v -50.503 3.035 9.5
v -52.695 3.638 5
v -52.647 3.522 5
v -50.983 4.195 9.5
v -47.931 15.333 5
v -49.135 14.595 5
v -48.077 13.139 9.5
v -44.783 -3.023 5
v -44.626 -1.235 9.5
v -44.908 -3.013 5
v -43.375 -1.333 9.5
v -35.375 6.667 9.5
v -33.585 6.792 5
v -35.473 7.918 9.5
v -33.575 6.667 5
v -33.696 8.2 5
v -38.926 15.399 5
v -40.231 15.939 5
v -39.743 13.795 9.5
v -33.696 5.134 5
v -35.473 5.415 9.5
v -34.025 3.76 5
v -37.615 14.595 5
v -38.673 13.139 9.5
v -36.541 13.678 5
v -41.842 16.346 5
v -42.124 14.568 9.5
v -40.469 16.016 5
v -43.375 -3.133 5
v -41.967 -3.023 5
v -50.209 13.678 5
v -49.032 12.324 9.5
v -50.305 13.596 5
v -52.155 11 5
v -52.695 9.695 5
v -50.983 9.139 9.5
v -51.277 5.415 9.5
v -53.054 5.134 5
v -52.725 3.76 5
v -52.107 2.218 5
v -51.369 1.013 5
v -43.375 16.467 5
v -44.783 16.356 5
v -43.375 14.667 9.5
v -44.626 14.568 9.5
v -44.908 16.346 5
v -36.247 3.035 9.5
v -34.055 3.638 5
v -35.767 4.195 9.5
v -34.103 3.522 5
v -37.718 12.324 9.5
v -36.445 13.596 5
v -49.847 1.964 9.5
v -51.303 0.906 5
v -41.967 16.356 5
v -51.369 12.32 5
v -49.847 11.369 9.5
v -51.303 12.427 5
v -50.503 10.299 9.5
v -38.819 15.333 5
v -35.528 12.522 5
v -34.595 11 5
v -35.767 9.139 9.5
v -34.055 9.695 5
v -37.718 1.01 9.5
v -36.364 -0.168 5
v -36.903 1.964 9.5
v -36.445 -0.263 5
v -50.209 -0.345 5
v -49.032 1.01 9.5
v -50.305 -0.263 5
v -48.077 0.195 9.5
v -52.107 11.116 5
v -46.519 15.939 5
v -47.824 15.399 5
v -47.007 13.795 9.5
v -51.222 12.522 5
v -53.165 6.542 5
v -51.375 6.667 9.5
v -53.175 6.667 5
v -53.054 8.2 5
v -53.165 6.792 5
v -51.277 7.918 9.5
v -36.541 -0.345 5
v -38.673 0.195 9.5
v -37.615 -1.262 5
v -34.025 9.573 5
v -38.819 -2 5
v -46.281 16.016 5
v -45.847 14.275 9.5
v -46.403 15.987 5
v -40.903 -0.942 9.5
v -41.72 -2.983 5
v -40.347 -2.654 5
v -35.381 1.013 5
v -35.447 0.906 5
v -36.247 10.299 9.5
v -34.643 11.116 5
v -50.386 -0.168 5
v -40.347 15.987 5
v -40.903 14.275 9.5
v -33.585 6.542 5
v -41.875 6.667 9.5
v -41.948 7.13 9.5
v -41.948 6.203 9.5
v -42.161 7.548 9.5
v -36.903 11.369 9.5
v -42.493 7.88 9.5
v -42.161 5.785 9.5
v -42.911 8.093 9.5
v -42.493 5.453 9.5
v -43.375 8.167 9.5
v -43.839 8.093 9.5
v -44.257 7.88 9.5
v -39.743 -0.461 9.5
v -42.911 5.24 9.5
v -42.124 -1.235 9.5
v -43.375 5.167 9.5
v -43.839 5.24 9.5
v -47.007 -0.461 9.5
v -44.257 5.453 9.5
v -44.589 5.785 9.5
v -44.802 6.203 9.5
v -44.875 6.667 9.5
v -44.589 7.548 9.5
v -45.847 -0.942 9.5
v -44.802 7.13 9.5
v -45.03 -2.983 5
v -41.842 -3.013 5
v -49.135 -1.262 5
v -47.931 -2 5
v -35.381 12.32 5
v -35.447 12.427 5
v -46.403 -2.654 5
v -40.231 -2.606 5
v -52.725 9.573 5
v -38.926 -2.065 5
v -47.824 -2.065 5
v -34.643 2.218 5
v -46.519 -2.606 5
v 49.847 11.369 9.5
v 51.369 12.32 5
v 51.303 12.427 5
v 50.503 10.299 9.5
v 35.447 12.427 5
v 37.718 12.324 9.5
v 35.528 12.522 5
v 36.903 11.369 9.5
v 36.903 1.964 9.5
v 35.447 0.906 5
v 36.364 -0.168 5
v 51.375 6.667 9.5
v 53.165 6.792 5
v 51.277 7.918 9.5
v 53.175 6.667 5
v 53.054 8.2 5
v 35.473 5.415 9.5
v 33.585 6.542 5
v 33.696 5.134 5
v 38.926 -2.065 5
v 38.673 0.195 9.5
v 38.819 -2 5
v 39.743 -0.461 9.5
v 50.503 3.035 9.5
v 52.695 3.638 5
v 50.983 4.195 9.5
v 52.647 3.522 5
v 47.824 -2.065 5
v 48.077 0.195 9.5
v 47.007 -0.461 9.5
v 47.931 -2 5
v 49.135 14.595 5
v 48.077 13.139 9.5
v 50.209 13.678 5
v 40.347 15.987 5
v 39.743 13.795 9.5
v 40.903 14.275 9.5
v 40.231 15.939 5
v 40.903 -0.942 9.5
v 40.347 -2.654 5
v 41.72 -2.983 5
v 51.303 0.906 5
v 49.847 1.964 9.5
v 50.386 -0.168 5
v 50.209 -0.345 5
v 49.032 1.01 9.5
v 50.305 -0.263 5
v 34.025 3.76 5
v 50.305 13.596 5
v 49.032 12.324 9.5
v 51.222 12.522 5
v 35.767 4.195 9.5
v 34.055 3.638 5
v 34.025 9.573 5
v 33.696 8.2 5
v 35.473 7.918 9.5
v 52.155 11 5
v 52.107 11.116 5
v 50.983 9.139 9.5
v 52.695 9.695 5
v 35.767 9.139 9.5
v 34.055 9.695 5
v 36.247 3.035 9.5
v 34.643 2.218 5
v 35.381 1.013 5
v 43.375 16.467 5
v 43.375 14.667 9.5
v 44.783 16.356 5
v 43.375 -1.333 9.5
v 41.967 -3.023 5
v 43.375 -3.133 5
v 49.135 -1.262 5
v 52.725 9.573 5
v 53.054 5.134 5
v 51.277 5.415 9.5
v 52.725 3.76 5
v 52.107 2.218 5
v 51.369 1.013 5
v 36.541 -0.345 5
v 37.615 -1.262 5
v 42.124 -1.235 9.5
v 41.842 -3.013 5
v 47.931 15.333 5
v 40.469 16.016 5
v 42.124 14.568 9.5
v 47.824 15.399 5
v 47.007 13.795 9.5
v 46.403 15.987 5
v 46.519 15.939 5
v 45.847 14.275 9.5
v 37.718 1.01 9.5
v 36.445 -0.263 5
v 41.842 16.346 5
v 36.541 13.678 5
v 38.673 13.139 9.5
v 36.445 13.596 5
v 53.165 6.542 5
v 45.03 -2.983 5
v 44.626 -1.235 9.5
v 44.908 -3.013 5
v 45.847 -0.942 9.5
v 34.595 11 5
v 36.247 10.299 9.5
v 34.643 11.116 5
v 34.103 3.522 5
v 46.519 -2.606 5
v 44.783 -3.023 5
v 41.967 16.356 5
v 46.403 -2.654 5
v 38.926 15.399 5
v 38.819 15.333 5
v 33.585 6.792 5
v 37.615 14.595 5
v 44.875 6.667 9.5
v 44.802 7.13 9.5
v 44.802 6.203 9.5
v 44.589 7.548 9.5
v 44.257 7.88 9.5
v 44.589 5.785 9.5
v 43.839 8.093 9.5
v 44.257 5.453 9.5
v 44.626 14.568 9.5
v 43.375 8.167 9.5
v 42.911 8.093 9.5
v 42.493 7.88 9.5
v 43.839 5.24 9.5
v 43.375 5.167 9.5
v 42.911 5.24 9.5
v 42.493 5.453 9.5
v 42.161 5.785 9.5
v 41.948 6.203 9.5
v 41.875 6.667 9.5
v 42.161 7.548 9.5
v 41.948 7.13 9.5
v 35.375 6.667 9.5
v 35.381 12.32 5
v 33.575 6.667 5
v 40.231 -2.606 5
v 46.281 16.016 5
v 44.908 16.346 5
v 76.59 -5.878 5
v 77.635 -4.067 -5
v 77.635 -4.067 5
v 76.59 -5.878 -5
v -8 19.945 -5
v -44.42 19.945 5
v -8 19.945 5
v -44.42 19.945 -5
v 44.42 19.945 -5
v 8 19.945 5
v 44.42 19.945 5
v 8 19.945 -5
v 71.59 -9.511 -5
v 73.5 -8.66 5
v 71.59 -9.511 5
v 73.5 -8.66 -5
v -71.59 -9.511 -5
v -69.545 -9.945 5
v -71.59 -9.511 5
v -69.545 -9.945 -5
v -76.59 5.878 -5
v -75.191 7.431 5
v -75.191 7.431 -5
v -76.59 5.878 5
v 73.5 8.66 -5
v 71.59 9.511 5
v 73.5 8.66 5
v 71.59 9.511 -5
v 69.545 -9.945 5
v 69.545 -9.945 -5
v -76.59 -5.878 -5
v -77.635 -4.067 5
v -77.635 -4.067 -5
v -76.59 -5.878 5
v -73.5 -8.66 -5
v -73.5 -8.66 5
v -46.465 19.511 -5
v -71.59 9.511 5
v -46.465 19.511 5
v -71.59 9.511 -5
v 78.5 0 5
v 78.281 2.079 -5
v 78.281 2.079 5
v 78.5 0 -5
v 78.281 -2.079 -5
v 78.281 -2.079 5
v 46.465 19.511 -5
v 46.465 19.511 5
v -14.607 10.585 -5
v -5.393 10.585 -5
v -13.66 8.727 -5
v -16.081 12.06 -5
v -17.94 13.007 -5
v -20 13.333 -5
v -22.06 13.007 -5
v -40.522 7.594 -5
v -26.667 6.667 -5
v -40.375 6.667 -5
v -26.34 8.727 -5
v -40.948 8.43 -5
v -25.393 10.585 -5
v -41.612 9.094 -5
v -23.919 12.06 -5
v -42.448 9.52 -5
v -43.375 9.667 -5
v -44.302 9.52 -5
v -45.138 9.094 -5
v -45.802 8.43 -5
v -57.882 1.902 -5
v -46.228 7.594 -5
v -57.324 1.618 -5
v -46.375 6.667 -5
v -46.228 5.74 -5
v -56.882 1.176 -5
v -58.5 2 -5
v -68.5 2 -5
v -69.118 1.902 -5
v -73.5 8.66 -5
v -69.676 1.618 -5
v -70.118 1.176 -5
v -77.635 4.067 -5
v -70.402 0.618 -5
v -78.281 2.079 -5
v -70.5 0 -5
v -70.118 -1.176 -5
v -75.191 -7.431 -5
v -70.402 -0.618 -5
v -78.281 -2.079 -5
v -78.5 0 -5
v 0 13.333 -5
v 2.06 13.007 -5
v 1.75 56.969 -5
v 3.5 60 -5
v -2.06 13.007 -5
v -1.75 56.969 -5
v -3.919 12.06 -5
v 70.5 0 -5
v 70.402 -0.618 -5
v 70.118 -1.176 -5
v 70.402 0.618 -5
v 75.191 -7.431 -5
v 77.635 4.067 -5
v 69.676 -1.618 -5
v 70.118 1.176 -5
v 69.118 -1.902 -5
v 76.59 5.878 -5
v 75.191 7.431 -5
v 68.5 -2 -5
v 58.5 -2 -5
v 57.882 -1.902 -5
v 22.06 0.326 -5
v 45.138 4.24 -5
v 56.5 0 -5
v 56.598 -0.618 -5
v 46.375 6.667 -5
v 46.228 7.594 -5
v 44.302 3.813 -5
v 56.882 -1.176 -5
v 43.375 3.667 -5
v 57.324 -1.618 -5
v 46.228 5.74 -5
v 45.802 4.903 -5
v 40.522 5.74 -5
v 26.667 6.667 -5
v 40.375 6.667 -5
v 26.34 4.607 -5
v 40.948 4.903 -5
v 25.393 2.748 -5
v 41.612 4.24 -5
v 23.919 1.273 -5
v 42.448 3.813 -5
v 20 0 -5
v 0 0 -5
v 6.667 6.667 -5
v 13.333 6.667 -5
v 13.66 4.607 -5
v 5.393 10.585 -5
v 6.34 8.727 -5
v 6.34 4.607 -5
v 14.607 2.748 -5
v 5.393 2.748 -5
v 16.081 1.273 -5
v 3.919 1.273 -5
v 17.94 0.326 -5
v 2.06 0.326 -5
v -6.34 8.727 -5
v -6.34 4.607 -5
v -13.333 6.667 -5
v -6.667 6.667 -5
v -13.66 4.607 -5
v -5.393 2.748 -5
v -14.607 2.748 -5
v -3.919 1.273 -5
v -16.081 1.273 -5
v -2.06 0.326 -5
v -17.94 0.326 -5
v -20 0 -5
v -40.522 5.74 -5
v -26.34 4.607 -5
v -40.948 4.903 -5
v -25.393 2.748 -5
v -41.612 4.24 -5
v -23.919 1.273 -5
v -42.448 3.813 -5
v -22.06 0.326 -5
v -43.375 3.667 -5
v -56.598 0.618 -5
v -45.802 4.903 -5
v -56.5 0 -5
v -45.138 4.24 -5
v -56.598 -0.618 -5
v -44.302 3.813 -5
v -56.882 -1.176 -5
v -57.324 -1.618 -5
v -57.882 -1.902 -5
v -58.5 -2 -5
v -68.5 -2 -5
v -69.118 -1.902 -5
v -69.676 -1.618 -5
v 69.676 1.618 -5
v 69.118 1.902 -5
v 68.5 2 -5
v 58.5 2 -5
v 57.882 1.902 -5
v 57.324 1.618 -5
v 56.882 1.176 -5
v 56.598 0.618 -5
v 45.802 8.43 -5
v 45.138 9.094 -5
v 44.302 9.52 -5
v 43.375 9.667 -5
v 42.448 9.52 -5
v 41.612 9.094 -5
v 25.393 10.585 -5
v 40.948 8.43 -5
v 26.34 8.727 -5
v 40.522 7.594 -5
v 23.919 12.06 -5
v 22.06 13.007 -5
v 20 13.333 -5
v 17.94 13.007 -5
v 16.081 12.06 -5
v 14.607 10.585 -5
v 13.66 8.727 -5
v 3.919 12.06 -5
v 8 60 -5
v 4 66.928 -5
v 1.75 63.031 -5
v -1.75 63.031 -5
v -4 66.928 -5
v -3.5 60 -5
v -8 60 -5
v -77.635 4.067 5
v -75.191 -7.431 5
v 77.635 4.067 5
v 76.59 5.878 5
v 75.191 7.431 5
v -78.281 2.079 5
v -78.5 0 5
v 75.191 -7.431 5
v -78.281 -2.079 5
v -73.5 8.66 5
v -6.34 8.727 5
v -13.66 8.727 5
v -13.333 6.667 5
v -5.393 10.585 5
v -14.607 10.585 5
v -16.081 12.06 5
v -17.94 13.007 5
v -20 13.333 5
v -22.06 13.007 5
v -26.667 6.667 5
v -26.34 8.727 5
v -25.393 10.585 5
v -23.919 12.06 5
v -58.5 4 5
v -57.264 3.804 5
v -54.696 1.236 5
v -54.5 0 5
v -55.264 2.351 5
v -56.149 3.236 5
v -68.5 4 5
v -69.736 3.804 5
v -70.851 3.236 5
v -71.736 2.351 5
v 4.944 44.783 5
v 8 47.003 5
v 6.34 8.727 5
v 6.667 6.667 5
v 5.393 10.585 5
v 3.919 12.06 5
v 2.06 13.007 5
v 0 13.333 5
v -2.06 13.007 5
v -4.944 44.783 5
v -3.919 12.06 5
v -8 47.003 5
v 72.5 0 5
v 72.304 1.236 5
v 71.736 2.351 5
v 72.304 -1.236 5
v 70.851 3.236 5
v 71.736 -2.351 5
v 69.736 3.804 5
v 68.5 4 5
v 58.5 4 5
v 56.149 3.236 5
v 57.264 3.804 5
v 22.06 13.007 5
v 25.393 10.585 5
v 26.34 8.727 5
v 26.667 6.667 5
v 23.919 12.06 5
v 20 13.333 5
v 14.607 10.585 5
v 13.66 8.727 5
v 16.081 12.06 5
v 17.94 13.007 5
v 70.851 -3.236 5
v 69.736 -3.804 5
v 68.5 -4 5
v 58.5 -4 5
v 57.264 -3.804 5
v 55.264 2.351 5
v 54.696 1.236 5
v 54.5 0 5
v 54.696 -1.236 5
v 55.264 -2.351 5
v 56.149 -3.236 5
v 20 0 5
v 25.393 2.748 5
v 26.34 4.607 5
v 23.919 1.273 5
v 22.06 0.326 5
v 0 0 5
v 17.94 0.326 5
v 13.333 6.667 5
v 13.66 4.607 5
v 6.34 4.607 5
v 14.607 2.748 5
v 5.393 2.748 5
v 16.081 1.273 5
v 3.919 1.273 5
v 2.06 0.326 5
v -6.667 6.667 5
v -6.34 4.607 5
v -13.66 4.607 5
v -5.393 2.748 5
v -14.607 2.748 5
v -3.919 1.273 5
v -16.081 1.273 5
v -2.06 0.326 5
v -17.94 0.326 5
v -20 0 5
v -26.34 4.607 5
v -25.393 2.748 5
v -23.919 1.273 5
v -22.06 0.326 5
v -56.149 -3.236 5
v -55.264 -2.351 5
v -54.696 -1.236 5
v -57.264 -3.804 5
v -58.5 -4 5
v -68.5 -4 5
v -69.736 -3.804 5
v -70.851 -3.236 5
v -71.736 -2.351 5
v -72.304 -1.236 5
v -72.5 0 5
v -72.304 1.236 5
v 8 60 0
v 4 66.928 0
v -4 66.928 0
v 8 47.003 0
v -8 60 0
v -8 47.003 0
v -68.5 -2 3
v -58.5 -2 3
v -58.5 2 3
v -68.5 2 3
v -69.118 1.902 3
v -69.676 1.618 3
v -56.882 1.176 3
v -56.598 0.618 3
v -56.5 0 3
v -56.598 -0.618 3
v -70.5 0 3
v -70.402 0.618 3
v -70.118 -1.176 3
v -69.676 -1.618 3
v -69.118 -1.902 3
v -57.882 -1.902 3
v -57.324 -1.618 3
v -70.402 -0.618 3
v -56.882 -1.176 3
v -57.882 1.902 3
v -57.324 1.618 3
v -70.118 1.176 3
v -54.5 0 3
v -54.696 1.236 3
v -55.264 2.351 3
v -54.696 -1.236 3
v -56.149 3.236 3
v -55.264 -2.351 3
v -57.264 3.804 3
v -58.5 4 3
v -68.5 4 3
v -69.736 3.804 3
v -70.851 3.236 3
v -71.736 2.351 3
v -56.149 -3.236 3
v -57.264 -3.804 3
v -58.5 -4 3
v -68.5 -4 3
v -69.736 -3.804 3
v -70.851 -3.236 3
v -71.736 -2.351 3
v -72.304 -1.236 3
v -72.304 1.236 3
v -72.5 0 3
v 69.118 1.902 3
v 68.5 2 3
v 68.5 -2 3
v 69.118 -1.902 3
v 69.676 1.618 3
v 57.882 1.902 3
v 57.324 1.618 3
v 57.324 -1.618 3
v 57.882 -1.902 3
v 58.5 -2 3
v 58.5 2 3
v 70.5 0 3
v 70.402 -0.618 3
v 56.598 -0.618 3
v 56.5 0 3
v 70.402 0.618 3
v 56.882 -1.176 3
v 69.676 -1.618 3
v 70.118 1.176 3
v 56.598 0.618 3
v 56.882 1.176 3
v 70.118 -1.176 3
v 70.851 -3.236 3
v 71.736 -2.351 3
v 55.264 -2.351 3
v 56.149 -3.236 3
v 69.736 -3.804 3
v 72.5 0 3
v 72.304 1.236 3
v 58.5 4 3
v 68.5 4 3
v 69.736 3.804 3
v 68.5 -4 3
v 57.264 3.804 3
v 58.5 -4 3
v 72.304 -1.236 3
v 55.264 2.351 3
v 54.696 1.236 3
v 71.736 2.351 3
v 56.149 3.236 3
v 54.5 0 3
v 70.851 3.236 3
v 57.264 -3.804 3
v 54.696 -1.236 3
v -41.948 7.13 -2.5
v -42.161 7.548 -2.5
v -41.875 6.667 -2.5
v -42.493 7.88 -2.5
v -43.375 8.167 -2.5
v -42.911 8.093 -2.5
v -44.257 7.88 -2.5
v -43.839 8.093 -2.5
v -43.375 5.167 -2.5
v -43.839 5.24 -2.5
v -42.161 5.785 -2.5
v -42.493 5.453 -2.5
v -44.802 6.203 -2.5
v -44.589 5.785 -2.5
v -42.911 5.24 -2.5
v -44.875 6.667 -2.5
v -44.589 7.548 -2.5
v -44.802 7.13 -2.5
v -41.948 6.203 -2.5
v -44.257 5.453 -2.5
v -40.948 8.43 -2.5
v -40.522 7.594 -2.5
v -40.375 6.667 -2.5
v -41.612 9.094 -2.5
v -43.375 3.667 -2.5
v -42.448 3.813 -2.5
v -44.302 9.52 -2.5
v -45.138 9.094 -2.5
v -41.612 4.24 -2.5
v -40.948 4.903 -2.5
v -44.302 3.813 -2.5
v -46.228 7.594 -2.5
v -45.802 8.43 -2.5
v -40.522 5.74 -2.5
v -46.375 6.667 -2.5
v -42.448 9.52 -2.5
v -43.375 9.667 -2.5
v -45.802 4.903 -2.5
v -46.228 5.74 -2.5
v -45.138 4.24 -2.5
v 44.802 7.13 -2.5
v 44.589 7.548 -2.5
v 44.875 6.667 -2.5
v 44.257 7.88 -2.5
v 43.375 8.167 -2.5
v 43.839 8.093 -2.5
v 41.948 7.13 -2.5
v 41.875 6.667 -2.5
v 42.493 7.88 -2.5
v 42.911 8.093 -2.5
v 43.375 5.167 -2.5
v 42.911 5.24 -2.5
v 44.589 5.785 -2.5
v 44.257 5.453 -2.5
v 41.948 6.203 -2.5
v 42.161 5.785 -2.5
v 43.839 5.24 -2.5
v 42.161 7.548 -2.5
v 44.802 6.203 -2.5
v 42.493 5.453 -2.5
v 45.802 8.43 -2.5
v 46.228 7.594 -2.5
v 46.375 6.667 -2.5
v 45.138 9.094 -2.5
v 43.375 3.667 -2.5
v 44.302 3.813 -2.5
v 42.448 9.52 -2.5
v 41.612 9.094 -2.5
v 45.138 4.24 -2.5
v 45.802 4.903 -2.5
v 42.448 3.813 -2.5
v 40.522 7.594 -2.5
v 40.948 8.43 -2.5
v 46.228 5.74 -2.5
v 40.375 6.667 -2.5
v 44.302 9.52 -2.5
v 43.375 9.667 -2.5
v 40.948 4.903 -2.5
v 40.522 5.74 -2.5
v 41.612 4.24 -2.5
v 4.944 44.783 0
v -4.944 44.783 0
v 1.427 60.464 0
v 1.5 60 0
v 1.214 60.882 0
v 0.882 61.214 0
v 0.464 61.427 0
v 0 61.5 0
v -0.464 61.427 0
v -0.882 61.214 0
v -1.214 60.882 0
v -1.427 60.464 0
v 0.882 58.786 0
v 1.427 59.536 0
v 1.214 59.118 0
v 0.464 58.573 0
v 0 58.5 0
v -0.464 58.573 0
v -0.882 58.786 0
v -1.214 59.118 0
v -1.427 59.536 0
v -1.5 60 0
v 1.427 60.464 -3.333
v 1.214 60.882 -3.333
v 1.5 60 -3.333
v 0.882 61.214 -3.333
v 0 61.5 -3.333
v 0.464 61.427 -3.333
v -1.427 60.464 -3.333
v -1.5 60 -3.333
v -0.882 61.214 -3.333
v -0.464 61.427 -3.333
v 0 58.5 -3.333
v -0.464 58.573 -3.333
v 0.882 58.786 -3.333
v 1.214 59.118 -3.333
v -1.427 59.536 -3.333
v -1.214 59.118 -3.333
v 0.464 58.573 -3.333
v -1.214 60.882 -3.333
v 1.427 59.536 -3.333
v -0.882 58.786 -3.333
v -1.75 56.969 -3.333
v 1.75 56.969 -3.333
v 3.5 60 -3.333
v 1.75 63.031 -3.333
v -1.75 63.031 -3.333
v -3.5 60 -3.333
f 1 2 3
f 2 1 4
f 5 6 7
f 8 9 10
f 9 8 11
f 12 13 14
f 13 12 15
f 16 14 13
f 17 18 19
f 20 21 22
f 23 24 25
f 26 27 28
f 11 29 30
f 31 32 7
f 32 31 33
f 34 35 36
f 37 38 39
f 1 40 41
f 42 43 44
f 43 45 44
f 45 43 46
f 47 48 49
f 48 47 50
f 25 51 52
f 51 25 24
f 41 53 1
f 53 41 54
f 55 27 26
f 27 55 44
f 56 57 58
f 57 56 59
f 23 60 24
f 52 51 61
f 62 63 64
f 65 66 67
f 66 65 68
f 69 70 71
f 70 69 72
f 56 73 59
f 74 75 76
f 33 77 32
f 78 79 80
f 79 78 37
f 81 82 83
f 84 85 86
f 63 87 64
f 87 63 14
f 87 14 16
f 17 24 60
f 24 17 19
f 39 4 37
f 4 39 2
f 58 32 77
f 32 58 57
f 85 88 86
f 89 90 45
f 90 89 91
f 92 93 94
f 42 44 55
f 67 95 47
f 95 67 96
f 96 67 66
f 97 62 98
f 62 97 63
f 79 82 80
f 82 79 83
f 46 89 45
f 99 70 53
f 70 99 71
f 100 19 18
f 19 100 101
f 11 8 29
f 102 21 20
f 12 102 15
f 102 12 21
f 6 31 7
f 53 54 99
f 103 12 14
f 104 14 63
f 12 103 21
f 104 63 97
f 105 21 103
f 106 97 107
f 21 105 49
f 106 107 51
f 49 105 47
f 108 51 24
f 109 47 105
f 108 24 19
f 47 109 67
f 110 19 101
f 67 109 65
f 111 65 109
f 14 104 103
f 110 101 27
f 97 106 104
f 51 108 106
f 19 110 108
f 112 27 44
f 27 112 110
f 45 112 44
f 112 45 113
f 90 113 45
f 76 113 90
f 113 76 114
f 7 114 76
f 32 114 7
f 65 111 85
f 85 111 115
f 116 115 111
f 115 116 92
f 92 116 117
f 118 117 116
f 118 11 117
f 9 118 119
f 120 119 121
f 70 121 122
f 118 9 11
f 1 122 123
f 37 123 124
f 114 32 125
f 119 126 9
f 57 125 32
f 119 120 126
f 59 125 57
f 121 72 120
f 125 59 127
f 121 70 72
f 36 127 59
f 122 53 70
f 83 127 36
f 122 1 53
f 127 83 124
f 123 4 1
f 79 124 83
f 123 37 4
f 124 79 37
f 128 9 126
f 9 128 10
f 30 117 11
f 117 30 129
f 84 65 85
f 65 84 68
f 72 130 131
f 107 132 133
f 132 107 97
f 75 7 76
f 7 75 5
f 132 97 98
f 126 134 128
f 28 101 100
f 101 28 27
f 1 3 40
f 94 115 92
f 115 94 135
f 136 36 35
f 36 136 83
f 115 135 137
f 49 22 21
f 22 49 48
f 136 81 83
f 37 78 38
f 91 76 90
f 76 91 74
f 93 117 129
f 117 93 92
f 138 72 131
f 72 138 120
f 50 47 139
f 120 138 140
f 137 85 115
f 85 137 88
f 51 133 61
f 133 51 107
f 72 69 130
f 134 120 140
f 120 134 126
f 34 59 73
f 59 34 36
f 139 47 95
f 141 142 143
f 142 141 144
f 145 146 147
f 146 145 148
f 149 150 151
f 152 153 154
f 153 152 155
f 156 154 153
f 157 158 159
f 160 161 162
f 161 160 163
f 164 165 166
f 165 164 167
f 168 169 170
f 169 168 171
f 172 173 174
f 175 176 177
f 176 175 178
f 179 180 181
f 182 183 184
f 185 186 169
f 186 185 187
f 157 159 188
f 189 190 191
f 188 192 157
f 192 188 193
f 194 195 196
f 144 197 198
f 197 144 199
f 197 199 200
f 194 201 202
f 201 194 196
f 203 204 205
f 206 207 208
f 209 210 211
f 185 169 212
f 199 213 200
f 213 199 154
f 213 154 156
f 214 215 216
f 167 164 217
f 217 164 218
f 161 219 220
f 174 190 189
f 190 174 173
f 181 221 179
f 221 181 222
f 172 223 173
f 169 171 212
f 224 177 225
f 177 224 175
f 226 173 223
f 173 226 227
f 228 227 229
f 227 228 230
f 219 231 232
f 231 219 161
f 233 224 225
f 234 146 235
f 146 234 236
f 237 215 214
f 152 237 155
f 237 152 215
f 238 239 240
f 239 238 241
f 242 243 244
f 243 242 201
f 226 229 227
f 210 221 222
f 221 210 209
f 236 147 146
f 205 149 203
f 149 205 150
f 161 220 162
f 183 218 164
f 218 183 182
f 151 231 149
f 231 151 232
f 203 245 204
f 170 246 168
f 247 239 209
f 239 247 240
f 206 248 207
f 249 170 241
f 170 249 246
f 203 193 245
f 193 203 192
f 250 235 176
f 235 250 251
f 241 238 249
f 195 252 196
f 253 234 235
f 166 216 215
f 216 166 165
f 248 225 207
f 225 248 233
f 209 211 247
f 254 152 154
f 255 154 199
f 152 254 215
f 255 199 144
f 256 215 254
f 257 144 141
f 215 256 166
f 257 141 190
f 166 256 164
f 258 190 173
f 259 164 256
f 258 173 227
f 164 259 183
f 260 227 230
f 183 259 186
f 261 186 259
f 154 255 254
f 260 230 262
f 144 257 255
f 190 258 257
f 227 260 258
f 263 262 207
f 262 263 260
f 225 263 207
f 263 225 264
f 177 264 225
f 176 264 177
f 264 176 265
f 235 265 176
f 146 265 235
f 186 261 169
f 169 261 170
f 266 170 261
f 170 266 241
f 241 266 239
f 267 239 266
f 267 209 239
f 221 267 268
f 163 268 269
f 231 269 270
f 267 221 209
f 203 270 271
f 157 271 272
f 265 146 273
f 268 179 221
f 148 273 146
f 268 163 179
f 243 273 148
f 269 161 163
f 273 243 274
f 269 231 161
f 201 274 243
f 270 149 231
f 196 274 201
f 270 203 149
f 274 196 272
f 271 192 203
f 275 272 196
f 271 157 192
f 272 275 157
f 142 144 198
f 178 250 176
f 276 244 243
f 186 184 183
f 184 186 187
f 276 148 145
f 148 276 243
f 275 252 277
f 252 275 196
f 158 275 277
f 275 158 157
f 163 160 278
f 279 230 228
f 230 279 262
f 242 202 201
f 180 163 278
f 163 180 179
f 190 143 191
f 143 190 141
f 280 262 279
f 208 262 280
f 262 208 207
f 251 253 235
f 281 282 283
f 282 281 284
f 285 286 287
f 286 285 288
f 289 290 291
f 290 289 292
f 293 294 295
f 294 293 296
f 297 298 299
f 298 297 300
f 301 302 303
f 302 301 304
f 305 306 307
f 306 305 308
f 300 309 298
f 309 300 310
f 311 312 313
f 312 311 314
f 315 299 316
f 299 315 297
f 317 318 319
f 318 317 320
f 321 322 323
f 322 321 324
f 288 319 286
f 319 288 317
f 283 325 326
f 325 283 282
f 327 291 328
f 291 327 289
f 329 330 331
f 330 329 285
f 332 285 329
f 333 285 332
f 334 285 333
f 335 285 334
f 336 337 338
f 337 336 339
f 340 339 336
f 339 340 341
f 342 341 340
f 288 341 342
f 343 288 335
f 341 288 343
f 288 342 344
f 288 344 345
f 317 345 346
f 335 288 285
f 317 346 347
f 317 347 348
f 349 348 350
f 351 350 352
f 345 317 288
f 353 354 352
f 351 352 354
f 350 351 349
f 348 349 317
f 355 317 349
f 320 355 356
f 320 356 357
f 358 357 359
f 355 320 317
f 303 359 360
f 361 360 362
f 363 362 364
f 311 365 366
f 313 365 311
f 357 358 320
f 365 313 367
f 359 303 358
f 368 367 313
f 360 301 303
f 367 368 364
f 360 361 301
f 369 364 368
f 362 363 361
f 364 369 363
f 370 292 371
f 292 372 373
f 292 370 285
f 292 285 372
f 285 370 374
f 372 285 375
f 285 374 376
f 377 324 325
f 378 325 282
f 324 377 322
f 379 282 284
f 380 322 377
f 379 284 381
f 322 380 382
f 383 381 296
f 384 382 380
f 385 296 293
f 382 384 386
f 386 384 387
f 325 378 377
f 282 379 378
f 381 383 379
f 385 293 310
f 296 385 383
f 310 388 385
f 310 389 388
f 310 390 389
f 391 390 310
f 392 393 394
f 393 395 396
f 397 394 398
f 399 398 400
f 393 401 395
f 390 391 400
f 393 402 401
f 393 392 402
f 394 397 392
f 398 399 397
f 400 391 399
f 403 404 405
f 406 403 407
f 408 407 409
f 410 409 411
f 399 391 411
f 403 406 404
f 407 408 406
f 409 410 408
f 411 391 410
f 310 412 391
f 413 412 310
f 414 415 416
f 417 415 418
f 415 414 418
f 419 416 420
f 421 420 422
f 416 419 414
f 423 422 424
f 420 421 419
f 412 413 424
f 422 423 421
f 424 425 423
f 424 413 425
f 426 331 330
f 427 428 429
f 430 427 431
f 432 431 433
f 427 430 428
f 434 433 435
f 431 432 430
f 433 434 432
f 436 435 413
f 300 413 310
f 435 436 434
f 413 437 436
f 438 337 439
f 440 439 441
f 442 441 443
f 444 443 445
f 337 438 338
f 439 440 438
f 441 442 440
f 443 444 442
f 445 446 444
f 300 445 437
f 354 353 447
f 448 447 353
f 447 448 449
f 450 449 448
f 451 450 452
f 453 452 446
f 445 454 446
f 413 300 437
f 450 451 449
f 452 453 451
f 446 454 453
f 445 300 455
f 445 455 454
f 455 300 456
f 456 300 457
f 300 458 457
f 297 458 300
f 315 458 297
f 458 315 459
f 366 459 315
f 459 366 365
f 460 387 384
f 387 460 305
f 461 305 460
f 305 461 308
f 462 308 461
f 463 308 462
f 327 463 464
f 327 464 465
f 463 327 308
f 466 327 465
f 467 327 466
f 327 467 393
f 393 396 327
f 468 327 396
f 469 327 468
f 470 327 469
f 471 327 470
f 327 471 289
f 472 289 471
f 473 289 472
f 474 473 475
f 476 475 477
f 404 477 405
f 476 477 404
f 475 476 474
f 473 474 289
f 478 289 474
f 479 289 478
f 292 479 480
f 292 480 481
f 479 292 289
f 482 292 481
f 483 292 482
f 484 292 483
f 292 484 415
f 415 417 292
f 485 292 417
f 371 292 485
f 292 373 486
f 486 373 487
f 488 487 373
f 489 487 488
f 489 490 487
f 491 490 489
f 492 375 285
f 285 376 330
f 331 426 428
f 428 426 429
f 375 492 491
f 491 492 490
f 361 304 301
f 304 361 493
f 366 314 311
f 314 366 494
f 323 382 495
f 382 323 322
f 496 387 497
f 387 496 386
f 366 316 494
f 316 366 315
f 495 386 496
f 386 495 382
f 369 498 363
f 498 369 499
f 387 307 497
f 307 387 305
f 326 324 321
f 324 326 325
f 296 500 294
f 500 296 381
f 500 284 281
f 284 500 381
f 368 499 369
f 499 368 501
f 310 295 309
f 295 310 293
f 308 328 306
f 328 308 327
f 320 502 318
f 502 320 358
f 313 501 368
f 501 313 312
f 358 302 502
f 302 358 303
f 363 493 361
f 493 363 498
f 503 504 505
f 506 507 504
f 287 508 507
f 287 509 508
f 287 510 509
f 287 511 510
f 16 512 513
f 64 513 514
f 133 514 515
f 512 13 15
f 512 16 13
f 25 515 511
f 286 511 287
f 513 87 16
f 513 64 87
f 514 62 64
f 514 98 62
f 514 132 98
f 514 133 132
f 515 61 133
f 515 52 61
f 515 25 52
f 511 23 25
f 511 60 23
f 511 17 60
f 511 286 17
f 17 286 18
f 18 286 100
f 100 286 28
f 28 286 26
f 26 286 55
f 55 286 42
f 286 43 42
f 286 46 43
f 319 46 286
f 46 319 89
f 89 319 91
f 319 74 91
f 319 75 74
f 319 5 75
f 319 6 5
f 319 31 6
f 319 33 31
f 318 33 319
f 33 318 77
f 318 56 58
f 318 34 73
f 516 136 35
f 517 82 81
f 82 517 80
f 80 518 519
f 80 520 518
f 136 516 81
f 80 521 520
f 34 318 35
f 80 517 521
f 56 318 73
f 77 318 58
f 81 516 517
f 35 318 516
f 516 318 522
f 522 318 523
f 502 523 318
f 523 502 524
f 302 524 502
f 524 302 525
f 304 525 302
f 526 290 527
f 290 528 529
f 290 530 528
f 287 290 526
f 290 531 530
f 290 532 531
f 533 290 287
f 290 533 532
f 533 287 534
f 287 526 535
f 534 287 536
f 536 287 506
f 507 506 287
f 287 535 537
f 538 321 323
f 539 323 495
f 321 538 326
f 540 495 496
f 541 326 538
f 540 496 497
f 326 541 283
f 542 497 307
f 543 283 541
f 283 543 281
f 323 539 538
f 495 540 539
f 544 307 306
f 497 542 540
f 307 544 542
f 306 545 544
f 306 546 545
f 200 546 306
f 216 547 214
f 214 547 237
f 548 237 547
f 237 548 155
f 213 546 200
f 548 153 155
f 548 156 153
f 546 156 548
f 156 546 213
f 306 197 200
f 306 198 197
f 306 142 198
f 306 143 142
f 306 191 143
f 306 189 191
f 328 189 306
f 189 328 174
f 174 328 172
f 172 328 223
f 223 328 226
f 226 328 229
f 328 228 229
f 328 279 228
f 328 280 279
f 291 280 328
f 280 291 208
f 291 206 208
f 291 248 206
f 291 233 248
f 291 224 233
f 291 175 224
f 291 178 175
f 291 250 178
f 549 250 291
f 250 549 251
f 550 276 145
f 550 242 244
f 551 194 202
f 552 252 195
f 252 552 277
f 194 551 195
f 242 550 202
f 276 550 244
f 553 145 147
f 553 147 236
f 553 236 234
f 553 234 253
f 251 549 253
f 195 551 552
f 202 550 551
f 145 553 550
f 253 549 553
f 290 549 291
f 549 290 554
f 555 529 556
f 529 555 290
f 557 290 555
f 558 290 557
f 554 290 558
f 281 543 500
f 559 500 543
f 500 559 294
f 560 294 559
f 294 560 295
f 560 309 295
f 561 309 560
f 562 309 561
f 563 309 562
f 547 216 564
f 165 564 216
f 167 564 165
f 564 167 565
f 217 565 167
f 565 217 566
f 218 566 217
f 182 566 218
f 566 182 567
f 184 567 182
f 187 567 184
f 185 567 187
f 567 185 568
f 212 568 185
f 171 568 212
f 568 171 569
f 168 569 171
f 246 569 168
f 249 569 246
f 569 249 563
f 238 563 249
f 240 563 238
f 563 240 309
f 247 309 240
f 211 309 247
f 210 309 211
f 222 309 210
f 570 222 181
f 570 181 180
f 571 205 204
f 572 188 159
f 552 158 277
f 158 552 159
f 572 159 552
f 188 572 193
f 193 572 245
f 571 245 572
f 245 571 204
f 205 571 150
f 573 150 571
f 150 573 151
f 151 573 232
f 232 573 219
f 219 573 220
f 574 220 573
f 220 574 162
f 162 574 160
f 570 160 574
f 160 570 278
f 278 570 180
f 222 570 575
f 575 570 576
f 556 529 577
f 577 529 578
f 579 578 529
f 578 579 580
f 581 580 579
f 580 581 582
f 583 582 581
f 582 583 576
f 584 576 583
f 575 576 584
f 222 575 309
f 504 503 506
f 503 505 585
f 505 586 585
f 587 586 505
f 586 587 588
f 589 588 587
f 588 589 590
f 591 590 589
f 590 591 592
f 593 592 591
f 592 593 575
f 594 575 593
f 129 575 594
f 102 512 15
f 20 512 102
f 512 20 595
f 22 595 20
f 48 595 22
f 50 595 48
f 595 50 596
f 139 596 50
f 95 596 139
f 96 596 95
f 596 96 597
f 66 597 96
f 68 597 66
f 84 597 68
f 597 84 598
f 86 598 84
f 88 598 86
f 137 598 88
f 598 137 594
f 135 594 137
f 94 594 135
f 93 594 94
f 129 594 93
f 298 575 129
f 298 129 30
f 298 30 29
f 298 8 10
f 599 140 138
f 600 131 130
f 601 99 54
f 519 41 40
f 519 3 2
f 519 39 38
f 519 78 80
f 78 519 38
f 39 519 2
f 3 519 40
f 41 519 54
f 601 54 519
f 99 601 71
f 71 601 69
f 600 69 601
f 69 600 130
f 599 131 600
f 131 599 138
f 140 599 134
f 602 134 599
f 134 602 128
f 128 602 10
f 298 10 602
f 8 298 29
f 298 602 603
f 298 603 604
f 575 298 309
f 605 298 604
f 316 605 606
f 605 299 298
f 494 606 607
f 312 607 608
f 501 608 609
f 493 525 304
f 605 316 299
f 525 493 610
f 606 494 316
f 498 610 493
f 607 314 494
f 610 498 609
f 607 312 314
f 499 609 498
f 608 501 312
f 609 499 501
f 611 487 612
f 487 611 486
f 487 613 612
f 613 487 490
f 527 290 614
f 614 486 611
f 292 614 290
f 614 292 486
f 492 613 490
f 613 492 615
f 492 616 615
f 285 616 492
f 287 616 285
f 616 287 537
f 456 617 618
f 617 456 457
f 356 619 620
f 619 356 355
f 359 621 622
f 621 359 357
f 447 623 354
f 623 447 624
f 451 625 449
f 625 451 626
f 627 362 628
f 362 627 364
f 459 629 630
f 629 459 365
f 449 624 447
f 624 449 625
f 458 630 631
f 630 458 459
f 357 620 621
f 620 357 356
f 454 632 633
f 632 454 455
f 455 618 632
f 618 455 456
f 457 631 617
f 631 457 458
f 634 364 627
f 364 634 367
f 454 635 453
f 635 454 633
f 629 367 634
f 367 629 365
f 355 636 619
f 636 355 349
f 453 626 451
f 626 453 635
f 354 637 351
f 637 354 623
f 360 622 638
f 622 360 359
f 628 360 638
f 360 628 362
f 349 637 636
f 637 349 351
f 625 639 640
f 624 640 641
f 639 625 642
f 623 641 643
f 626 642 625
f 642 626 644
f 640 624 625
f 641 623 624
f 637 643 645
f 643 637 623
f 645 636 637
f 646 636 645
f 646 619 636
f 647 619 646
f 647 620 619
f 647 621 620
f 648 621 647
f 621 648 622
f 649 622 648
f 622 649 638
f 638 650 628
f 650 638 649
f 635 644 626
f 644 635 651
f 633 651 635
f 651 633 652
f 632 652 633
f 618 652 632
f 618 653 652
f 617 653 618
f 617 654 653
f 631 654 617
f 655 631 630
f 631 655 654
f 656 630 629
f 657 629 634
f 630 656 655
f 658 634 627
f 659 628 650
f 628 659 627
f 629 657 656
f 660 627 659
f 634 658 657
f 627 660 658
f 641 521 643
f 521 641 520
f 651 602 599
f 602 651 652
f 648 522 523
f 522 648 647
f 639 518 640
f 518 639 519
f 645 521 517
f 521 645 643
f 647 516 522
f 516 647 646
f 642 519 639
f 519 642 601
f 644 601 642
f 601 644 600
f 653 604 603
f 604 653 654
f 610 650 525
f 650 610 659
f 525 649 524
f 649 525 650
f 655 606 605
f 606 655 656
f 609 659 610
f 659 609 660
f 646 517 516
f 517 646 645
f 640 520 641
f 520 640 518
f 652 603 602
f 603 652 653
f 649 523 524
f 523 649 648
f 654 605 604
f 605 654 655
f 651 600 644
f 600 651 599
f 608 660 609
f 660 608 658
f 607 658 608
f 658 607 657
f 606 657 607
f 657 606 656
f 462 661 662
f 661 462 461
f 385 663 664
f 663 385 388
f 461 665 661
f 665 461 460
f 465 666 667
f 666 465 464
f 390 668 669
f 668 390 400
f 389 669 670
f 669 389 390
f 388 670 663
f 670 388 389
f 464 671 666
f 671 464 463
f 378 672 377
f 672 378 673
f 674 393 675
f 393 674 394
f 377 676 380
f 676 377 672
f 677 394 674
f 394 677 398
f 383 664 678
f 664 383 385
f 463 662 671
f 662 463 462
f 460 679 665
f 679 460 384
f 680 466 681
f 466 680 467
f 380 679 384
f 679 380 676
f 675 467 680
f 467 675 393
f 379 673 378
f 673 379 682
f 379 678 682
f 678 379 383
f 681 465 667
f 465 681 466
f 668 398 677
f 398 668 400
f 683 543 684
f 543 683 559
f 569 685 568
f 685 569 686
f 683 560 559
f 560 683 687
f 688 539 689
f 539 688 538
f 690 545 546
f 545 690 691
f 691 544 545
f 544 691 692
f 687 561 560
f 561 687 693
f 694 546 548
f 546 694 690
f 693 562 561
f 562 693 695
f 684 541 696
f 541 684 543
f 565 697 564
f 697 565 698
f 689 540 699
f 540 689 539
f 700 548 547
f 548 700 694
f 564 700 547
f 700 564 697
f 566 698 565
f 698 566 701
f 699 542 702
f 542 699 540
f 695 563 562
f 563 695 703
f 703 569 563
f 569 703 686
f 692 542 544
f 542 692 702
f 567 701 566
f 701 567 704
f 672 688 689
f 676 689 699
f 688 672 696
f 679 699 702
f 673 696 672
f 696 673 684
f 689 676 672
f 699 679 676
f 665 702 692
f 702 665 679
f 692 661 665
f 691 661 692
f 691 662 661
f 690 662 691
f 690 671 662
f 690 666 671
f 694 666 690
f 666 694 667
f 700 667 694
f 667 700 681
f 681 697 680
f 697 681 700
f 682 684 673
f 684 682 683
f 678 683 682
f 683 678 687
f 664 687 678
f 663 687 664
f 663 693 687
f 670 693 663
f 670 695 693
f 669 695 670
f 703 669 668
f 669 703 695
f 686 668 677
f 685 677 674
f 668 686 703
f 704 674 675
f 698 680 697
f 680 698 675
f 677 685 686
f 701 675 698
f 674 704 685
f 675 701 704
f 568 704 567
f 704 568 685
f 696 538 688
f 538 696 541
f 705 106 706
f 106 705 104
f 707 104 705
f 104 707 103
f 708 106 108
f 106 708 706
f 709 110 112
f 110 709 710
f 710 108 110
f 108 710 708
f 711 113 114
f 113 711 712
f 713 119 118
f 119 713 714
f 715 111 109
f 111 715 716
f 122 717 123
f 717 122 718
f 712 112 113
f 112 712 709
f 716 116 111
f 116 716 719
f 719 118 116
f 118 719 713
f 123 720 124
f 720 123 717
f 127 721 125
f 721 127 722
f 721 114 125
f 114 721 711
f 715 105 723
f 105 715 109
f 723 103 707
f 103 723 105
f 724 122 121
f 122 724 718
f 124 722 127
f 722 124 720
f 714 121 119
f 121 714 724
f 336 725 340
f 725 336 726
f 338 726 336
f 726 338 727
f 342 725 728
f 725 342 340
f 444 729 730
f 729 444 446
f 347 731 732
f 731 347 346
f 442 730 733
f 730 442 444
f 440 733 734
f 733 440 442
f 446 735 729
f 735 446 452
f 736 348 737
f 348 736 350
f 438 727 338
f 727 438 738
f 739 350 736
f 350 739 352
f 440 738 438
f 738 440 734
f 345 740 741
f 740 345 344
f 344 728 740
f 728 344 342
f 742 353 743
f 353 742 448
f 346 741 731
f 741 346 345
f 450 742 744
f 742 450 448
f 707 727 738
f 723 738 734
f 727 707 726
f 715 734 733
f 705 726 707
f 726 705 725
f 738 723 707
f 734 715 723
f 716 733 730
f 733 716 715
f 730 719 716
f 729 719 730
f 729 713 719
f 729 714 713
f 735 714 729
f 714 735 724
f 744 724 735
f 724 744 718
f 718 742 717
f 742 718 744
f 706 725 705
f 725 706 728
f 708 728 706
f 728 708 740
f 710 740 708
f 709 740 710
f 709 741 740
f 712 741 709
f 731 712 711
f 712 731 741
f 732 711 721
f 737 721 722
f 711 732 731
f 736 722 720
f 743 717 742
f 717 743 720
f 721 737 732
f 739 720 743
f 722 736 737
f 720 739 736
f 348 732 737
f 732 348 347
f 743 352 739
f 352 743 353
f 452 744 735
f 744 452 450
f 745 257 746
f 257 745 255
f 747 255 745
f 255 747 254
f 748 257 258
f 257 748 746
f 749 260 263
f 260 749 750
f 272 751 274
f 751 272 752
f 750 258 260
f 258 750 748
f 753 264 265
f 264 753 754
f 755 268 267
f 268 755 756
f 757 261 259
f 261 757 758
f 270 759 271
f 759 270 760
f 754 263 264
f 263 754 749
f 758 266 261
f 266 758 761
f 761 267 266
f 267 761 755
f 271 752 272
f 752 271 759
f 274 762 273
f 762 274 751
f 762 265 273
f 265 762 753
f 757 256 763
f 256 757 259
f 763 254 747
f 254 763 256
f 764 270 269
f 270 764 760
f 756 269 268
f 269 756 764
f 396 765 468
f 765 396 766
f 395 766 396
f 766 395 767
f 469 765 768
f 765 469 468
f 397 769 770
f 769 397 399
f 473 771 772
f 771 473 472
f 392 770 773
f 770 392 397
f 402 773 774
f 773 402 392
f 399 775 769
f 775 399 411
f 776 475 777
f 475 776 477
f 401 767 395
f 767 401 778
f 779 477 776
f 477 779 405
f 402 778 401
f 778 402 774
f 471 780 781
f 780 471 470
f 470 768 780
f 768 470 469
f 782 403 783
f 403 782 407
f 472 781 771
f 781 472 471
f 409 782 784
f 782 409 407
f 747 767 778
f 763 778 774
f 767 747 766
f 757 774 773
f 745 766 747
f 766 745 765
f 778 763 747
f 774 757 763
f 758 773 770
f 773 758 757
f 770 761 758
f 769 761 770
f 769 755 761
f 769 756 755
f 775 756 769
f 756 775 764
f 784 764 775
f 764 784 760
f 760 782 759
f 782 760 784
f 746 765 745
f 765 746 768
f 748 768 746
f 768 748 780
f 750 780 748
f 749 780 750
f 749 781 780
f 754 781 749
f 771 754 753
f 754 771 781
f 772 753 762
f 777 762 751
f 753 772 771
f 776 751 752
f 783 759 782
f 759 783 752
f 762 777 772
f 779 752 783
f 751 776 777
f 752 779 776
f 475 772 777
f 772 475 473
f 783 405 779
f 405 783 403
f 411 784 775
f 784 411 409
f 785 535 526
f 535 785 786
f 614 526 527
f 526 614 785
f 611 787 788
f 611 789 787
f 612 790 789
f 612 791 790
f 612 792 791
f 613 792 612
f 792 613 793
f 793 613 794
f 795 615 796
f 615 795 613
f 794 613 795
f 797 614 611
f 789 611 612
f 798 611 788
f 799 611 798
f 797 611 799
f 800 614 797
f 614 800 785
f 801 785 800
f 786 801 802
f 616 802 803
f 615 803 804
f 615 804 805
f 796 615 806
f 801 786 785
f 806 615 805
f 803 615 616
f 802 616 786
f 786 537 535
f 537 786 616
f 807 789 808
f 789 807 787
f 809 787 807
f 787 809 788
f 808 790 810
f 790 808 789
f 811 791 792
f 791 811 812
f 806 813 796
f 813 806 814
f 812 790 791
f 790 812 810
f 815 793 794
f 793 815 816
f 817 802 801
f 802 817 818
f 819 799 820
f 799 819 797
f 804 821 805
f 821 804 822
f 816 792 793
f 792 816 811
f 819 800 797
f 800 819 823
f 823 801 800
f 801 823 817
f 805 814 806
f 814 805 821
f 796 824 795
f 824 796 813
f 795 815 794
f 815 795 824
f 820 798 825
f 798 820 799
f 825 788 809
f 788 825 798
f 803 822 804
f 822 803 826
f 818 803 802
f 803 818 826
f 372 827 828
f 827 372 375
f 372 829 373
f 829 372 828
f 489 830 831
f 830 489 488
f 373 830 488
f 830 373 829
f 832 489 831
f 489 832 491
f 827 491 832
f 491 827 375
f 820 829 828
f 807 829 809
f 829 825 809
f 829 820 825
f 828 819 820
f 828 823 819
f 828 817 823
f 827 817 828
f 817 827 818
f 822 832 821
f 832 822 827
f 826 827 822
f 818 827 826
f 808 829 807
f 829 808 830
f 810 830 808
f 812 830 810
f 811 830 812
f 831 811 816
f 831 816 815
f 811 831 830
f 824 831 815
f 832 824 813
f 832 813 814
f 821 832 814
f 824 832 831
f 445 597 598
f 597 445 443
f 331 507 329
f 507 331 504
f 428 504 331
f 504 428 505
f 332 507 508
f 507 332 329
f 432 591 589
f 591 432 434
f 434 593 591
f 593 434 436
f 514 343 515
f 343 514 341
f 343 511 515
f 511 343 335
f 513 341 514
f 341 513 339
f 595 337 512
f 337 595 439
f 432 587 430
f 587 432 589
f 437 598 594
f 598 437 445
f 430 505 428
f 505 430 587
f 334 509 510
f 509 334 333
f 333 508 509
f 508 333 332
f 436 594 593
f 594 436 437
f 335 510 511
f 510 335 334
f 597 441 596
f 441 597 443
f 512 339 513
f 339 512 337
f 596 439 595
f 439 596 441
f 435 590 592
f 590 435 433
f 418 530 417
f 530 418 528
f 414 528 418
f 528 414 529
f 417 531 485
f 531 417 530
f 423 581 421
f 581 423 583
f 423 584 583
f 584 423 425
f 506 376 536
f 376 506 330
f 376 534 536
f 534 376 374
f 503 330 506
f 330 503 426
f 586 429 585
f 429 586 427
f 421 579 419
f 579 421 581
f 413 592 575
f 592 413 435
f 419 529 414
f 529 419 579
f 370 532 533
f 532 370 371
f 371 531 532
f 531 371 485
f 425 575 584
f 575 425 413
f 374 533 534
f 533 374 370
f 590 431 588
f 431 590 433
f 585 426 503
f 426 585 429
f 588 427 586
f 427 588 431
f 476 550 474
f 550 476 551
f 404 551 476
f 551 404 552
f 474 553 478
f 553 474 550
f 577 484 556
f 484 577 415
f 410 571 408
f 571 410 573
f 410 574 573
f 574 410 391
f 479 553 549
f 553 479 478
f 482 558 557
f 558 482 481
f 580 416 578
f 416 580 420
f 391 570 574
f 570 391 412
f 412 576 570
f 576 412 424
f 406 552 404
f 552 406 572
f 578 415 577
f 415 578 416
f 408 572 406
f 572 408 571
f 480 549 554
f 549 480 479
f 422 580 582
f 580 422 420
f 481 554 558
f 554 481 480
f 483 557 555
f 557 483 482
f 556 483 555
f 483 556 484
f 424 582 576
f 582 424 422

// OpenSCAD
mountDistance= 137;
boardMountDistance = 86.75;
thick=10;
extrusion=20;

m4ScrewRadius = 2;
m4ScrewHeaderRadius = 4;

m3ScrewRadius = 1.5;
m3ScrewHeaderRadius = 3;
m3NutRadius= 3.5;

circleOuterRadius=40;
circleInnerRadius=40-extrusion/2;

hbsupportDistance = 150;

centerArmLength=hbsupportDistance/2 +5;

module hbsupport(){

    difference(){
	union(){
	    hull()
	    {
		for(i=[-mountDistance/2,mountDistance/2])
		translate([i,0,0])cylinder(r=extrusion/2,h=thick,center=true);
		
		//hull()
		for(i=[-boardMountDistance/2,boardMountDistance/2])
		translate([i,extrusion/2,0])cylinder(r=extrusion/2,h=thick,center=true);
	    }

	    // spring fixing poles
	    for(i=[-boardMountDistance/2,boardMountDistance/2])
	    translate([i,extrusion/3,7]){
		//cylinder(r1=3.5,r2=3, h=20,center=true,$fn=20);
		cylinder(r1=extrusion/2, r2=extrusion/2-2,h=5, center=true, $fn=40);
	    }
	    
	    hull()
	    for(y=[extrusion/2, 3*extrusion])
	    translate([0,y,0]) cylinder(r=extrusion*.4,h=thick,center=true, $fn=6);
	}

	// m4 screw hole to mount on the aluminum
	for(i=[-1,1])
	{
	    hull()for(j=[0,10])translate([(mountDistance/2-j)*i,0,0])
	    cylinder(r=m4ScrewRadius,h=thick*2,center=true, $fn=20);
	    
	    hull()for(j=[0,10])translate([(mountDistance/2-j)*i,0,0])
	    translate([0,0,thick/2])cylinder(r=m4ScrewHeaderRadius, h= 4, center=true, $fn=20);
	}

	// m4 screw hole to mount the plate
	for(i=[-boardMountDistance/2,boardMountDistance/2])
	translate([i,extrusion/3,0]){
	    cylinder(r=m3ScrewRadius, h=thick*5,center=true,$fn=20);
	    translate([0,0,-5])cylinder(r=m3ScrewHeaderRadius, h=thick*.5, center=true, $fn=20);
	}

	// for space to make the connections
	translate([0,3*extrusion,thick/2])
	{
	    cylinder(r=extrusion*.8, h=thick,center=true, $fn=10);
	    cylinder(r=m3ScrewRadius, h=thick*5,center=true, $fn=20);
	    translate([0,0,-thick])cylinder(r=m3NutRadius,h=thick/3, center=true, $fn=6);
	}

	// leave some holes
	for(i=[-extrusion,0, extrusion]) translate([i,extrusion/3,0])
	cylinder(r=extrusion/3, h=thick*2,center=true, $fn=20);

    }
	
}



module centerSupport(){
    // circle in the middle
    difference(){
	cylinder(r=circleOuterRadius, h=thick, $fn=60);
	translate([0,0,-1])cylinder(r=circleInnerRadius, h=thick*2, $fn=60);
    }

    // 3 arms
    difference(){
	for(i=[0,120,240])rotate([0,0,i+30])
	hull(){
	    translate([0,-centerArmLength,0])cylinder(r=extrusion*.4,h=thick,$fn=6);
	    translate([0,0,0])cylinder(r=extrusion*.4,h=thick,$fn=20);
	}

	// m3 screw at the center
	cylinder(r=m3ScrewRadius, h=thick*5, center=true, $fn=20);
	cylinder(r=m3ScrewHeaderRadius, h=thick, center=true, $fn=20);

	// m3 screw at the cross of circle and arm
	for(i=[0,120,240]) rotate([0,0,i+30])
	translate([0,-circleOuterRadius-10,0]){
	    cylinder(r=m3ScrewRadius, h=thick*3, center=true, $fn=20);
	    translate([0,0,-1]) cylinder(r=m3ScrewHeaderRadius, h=thick/2, $fn=20);
	}

	// spaces and m3 screw holes at the end of the arm
	for(i=[0,120,240])rotate([0,0,i+30])
	{
	    hull() for(j=[-2,10])
	    translate([0,-centerArmLength+j,0])cylinder(r=m3ScrewRadius,h=thick*2,$fn=20);

	    hull() for(j=[-2,10])
	    translate([0,-centerArmLength+j,-.5])cylinder(r=extrusion*.5, h=thick/2+1,$fn=6);

	    hull() for(j=[-2,10])
	    translate([0,-centerArmLength+j,thick*.75])cylinder(r=m3ScrewHeaderRadius,h=3,$fn=20);
	}

	
    }
    
    
}

//for(i=[0,120,240])rotate([0,0,i+30])translate([0, -hbsupportDistance,thick/2])
hbsupport();

//centerSupport();
